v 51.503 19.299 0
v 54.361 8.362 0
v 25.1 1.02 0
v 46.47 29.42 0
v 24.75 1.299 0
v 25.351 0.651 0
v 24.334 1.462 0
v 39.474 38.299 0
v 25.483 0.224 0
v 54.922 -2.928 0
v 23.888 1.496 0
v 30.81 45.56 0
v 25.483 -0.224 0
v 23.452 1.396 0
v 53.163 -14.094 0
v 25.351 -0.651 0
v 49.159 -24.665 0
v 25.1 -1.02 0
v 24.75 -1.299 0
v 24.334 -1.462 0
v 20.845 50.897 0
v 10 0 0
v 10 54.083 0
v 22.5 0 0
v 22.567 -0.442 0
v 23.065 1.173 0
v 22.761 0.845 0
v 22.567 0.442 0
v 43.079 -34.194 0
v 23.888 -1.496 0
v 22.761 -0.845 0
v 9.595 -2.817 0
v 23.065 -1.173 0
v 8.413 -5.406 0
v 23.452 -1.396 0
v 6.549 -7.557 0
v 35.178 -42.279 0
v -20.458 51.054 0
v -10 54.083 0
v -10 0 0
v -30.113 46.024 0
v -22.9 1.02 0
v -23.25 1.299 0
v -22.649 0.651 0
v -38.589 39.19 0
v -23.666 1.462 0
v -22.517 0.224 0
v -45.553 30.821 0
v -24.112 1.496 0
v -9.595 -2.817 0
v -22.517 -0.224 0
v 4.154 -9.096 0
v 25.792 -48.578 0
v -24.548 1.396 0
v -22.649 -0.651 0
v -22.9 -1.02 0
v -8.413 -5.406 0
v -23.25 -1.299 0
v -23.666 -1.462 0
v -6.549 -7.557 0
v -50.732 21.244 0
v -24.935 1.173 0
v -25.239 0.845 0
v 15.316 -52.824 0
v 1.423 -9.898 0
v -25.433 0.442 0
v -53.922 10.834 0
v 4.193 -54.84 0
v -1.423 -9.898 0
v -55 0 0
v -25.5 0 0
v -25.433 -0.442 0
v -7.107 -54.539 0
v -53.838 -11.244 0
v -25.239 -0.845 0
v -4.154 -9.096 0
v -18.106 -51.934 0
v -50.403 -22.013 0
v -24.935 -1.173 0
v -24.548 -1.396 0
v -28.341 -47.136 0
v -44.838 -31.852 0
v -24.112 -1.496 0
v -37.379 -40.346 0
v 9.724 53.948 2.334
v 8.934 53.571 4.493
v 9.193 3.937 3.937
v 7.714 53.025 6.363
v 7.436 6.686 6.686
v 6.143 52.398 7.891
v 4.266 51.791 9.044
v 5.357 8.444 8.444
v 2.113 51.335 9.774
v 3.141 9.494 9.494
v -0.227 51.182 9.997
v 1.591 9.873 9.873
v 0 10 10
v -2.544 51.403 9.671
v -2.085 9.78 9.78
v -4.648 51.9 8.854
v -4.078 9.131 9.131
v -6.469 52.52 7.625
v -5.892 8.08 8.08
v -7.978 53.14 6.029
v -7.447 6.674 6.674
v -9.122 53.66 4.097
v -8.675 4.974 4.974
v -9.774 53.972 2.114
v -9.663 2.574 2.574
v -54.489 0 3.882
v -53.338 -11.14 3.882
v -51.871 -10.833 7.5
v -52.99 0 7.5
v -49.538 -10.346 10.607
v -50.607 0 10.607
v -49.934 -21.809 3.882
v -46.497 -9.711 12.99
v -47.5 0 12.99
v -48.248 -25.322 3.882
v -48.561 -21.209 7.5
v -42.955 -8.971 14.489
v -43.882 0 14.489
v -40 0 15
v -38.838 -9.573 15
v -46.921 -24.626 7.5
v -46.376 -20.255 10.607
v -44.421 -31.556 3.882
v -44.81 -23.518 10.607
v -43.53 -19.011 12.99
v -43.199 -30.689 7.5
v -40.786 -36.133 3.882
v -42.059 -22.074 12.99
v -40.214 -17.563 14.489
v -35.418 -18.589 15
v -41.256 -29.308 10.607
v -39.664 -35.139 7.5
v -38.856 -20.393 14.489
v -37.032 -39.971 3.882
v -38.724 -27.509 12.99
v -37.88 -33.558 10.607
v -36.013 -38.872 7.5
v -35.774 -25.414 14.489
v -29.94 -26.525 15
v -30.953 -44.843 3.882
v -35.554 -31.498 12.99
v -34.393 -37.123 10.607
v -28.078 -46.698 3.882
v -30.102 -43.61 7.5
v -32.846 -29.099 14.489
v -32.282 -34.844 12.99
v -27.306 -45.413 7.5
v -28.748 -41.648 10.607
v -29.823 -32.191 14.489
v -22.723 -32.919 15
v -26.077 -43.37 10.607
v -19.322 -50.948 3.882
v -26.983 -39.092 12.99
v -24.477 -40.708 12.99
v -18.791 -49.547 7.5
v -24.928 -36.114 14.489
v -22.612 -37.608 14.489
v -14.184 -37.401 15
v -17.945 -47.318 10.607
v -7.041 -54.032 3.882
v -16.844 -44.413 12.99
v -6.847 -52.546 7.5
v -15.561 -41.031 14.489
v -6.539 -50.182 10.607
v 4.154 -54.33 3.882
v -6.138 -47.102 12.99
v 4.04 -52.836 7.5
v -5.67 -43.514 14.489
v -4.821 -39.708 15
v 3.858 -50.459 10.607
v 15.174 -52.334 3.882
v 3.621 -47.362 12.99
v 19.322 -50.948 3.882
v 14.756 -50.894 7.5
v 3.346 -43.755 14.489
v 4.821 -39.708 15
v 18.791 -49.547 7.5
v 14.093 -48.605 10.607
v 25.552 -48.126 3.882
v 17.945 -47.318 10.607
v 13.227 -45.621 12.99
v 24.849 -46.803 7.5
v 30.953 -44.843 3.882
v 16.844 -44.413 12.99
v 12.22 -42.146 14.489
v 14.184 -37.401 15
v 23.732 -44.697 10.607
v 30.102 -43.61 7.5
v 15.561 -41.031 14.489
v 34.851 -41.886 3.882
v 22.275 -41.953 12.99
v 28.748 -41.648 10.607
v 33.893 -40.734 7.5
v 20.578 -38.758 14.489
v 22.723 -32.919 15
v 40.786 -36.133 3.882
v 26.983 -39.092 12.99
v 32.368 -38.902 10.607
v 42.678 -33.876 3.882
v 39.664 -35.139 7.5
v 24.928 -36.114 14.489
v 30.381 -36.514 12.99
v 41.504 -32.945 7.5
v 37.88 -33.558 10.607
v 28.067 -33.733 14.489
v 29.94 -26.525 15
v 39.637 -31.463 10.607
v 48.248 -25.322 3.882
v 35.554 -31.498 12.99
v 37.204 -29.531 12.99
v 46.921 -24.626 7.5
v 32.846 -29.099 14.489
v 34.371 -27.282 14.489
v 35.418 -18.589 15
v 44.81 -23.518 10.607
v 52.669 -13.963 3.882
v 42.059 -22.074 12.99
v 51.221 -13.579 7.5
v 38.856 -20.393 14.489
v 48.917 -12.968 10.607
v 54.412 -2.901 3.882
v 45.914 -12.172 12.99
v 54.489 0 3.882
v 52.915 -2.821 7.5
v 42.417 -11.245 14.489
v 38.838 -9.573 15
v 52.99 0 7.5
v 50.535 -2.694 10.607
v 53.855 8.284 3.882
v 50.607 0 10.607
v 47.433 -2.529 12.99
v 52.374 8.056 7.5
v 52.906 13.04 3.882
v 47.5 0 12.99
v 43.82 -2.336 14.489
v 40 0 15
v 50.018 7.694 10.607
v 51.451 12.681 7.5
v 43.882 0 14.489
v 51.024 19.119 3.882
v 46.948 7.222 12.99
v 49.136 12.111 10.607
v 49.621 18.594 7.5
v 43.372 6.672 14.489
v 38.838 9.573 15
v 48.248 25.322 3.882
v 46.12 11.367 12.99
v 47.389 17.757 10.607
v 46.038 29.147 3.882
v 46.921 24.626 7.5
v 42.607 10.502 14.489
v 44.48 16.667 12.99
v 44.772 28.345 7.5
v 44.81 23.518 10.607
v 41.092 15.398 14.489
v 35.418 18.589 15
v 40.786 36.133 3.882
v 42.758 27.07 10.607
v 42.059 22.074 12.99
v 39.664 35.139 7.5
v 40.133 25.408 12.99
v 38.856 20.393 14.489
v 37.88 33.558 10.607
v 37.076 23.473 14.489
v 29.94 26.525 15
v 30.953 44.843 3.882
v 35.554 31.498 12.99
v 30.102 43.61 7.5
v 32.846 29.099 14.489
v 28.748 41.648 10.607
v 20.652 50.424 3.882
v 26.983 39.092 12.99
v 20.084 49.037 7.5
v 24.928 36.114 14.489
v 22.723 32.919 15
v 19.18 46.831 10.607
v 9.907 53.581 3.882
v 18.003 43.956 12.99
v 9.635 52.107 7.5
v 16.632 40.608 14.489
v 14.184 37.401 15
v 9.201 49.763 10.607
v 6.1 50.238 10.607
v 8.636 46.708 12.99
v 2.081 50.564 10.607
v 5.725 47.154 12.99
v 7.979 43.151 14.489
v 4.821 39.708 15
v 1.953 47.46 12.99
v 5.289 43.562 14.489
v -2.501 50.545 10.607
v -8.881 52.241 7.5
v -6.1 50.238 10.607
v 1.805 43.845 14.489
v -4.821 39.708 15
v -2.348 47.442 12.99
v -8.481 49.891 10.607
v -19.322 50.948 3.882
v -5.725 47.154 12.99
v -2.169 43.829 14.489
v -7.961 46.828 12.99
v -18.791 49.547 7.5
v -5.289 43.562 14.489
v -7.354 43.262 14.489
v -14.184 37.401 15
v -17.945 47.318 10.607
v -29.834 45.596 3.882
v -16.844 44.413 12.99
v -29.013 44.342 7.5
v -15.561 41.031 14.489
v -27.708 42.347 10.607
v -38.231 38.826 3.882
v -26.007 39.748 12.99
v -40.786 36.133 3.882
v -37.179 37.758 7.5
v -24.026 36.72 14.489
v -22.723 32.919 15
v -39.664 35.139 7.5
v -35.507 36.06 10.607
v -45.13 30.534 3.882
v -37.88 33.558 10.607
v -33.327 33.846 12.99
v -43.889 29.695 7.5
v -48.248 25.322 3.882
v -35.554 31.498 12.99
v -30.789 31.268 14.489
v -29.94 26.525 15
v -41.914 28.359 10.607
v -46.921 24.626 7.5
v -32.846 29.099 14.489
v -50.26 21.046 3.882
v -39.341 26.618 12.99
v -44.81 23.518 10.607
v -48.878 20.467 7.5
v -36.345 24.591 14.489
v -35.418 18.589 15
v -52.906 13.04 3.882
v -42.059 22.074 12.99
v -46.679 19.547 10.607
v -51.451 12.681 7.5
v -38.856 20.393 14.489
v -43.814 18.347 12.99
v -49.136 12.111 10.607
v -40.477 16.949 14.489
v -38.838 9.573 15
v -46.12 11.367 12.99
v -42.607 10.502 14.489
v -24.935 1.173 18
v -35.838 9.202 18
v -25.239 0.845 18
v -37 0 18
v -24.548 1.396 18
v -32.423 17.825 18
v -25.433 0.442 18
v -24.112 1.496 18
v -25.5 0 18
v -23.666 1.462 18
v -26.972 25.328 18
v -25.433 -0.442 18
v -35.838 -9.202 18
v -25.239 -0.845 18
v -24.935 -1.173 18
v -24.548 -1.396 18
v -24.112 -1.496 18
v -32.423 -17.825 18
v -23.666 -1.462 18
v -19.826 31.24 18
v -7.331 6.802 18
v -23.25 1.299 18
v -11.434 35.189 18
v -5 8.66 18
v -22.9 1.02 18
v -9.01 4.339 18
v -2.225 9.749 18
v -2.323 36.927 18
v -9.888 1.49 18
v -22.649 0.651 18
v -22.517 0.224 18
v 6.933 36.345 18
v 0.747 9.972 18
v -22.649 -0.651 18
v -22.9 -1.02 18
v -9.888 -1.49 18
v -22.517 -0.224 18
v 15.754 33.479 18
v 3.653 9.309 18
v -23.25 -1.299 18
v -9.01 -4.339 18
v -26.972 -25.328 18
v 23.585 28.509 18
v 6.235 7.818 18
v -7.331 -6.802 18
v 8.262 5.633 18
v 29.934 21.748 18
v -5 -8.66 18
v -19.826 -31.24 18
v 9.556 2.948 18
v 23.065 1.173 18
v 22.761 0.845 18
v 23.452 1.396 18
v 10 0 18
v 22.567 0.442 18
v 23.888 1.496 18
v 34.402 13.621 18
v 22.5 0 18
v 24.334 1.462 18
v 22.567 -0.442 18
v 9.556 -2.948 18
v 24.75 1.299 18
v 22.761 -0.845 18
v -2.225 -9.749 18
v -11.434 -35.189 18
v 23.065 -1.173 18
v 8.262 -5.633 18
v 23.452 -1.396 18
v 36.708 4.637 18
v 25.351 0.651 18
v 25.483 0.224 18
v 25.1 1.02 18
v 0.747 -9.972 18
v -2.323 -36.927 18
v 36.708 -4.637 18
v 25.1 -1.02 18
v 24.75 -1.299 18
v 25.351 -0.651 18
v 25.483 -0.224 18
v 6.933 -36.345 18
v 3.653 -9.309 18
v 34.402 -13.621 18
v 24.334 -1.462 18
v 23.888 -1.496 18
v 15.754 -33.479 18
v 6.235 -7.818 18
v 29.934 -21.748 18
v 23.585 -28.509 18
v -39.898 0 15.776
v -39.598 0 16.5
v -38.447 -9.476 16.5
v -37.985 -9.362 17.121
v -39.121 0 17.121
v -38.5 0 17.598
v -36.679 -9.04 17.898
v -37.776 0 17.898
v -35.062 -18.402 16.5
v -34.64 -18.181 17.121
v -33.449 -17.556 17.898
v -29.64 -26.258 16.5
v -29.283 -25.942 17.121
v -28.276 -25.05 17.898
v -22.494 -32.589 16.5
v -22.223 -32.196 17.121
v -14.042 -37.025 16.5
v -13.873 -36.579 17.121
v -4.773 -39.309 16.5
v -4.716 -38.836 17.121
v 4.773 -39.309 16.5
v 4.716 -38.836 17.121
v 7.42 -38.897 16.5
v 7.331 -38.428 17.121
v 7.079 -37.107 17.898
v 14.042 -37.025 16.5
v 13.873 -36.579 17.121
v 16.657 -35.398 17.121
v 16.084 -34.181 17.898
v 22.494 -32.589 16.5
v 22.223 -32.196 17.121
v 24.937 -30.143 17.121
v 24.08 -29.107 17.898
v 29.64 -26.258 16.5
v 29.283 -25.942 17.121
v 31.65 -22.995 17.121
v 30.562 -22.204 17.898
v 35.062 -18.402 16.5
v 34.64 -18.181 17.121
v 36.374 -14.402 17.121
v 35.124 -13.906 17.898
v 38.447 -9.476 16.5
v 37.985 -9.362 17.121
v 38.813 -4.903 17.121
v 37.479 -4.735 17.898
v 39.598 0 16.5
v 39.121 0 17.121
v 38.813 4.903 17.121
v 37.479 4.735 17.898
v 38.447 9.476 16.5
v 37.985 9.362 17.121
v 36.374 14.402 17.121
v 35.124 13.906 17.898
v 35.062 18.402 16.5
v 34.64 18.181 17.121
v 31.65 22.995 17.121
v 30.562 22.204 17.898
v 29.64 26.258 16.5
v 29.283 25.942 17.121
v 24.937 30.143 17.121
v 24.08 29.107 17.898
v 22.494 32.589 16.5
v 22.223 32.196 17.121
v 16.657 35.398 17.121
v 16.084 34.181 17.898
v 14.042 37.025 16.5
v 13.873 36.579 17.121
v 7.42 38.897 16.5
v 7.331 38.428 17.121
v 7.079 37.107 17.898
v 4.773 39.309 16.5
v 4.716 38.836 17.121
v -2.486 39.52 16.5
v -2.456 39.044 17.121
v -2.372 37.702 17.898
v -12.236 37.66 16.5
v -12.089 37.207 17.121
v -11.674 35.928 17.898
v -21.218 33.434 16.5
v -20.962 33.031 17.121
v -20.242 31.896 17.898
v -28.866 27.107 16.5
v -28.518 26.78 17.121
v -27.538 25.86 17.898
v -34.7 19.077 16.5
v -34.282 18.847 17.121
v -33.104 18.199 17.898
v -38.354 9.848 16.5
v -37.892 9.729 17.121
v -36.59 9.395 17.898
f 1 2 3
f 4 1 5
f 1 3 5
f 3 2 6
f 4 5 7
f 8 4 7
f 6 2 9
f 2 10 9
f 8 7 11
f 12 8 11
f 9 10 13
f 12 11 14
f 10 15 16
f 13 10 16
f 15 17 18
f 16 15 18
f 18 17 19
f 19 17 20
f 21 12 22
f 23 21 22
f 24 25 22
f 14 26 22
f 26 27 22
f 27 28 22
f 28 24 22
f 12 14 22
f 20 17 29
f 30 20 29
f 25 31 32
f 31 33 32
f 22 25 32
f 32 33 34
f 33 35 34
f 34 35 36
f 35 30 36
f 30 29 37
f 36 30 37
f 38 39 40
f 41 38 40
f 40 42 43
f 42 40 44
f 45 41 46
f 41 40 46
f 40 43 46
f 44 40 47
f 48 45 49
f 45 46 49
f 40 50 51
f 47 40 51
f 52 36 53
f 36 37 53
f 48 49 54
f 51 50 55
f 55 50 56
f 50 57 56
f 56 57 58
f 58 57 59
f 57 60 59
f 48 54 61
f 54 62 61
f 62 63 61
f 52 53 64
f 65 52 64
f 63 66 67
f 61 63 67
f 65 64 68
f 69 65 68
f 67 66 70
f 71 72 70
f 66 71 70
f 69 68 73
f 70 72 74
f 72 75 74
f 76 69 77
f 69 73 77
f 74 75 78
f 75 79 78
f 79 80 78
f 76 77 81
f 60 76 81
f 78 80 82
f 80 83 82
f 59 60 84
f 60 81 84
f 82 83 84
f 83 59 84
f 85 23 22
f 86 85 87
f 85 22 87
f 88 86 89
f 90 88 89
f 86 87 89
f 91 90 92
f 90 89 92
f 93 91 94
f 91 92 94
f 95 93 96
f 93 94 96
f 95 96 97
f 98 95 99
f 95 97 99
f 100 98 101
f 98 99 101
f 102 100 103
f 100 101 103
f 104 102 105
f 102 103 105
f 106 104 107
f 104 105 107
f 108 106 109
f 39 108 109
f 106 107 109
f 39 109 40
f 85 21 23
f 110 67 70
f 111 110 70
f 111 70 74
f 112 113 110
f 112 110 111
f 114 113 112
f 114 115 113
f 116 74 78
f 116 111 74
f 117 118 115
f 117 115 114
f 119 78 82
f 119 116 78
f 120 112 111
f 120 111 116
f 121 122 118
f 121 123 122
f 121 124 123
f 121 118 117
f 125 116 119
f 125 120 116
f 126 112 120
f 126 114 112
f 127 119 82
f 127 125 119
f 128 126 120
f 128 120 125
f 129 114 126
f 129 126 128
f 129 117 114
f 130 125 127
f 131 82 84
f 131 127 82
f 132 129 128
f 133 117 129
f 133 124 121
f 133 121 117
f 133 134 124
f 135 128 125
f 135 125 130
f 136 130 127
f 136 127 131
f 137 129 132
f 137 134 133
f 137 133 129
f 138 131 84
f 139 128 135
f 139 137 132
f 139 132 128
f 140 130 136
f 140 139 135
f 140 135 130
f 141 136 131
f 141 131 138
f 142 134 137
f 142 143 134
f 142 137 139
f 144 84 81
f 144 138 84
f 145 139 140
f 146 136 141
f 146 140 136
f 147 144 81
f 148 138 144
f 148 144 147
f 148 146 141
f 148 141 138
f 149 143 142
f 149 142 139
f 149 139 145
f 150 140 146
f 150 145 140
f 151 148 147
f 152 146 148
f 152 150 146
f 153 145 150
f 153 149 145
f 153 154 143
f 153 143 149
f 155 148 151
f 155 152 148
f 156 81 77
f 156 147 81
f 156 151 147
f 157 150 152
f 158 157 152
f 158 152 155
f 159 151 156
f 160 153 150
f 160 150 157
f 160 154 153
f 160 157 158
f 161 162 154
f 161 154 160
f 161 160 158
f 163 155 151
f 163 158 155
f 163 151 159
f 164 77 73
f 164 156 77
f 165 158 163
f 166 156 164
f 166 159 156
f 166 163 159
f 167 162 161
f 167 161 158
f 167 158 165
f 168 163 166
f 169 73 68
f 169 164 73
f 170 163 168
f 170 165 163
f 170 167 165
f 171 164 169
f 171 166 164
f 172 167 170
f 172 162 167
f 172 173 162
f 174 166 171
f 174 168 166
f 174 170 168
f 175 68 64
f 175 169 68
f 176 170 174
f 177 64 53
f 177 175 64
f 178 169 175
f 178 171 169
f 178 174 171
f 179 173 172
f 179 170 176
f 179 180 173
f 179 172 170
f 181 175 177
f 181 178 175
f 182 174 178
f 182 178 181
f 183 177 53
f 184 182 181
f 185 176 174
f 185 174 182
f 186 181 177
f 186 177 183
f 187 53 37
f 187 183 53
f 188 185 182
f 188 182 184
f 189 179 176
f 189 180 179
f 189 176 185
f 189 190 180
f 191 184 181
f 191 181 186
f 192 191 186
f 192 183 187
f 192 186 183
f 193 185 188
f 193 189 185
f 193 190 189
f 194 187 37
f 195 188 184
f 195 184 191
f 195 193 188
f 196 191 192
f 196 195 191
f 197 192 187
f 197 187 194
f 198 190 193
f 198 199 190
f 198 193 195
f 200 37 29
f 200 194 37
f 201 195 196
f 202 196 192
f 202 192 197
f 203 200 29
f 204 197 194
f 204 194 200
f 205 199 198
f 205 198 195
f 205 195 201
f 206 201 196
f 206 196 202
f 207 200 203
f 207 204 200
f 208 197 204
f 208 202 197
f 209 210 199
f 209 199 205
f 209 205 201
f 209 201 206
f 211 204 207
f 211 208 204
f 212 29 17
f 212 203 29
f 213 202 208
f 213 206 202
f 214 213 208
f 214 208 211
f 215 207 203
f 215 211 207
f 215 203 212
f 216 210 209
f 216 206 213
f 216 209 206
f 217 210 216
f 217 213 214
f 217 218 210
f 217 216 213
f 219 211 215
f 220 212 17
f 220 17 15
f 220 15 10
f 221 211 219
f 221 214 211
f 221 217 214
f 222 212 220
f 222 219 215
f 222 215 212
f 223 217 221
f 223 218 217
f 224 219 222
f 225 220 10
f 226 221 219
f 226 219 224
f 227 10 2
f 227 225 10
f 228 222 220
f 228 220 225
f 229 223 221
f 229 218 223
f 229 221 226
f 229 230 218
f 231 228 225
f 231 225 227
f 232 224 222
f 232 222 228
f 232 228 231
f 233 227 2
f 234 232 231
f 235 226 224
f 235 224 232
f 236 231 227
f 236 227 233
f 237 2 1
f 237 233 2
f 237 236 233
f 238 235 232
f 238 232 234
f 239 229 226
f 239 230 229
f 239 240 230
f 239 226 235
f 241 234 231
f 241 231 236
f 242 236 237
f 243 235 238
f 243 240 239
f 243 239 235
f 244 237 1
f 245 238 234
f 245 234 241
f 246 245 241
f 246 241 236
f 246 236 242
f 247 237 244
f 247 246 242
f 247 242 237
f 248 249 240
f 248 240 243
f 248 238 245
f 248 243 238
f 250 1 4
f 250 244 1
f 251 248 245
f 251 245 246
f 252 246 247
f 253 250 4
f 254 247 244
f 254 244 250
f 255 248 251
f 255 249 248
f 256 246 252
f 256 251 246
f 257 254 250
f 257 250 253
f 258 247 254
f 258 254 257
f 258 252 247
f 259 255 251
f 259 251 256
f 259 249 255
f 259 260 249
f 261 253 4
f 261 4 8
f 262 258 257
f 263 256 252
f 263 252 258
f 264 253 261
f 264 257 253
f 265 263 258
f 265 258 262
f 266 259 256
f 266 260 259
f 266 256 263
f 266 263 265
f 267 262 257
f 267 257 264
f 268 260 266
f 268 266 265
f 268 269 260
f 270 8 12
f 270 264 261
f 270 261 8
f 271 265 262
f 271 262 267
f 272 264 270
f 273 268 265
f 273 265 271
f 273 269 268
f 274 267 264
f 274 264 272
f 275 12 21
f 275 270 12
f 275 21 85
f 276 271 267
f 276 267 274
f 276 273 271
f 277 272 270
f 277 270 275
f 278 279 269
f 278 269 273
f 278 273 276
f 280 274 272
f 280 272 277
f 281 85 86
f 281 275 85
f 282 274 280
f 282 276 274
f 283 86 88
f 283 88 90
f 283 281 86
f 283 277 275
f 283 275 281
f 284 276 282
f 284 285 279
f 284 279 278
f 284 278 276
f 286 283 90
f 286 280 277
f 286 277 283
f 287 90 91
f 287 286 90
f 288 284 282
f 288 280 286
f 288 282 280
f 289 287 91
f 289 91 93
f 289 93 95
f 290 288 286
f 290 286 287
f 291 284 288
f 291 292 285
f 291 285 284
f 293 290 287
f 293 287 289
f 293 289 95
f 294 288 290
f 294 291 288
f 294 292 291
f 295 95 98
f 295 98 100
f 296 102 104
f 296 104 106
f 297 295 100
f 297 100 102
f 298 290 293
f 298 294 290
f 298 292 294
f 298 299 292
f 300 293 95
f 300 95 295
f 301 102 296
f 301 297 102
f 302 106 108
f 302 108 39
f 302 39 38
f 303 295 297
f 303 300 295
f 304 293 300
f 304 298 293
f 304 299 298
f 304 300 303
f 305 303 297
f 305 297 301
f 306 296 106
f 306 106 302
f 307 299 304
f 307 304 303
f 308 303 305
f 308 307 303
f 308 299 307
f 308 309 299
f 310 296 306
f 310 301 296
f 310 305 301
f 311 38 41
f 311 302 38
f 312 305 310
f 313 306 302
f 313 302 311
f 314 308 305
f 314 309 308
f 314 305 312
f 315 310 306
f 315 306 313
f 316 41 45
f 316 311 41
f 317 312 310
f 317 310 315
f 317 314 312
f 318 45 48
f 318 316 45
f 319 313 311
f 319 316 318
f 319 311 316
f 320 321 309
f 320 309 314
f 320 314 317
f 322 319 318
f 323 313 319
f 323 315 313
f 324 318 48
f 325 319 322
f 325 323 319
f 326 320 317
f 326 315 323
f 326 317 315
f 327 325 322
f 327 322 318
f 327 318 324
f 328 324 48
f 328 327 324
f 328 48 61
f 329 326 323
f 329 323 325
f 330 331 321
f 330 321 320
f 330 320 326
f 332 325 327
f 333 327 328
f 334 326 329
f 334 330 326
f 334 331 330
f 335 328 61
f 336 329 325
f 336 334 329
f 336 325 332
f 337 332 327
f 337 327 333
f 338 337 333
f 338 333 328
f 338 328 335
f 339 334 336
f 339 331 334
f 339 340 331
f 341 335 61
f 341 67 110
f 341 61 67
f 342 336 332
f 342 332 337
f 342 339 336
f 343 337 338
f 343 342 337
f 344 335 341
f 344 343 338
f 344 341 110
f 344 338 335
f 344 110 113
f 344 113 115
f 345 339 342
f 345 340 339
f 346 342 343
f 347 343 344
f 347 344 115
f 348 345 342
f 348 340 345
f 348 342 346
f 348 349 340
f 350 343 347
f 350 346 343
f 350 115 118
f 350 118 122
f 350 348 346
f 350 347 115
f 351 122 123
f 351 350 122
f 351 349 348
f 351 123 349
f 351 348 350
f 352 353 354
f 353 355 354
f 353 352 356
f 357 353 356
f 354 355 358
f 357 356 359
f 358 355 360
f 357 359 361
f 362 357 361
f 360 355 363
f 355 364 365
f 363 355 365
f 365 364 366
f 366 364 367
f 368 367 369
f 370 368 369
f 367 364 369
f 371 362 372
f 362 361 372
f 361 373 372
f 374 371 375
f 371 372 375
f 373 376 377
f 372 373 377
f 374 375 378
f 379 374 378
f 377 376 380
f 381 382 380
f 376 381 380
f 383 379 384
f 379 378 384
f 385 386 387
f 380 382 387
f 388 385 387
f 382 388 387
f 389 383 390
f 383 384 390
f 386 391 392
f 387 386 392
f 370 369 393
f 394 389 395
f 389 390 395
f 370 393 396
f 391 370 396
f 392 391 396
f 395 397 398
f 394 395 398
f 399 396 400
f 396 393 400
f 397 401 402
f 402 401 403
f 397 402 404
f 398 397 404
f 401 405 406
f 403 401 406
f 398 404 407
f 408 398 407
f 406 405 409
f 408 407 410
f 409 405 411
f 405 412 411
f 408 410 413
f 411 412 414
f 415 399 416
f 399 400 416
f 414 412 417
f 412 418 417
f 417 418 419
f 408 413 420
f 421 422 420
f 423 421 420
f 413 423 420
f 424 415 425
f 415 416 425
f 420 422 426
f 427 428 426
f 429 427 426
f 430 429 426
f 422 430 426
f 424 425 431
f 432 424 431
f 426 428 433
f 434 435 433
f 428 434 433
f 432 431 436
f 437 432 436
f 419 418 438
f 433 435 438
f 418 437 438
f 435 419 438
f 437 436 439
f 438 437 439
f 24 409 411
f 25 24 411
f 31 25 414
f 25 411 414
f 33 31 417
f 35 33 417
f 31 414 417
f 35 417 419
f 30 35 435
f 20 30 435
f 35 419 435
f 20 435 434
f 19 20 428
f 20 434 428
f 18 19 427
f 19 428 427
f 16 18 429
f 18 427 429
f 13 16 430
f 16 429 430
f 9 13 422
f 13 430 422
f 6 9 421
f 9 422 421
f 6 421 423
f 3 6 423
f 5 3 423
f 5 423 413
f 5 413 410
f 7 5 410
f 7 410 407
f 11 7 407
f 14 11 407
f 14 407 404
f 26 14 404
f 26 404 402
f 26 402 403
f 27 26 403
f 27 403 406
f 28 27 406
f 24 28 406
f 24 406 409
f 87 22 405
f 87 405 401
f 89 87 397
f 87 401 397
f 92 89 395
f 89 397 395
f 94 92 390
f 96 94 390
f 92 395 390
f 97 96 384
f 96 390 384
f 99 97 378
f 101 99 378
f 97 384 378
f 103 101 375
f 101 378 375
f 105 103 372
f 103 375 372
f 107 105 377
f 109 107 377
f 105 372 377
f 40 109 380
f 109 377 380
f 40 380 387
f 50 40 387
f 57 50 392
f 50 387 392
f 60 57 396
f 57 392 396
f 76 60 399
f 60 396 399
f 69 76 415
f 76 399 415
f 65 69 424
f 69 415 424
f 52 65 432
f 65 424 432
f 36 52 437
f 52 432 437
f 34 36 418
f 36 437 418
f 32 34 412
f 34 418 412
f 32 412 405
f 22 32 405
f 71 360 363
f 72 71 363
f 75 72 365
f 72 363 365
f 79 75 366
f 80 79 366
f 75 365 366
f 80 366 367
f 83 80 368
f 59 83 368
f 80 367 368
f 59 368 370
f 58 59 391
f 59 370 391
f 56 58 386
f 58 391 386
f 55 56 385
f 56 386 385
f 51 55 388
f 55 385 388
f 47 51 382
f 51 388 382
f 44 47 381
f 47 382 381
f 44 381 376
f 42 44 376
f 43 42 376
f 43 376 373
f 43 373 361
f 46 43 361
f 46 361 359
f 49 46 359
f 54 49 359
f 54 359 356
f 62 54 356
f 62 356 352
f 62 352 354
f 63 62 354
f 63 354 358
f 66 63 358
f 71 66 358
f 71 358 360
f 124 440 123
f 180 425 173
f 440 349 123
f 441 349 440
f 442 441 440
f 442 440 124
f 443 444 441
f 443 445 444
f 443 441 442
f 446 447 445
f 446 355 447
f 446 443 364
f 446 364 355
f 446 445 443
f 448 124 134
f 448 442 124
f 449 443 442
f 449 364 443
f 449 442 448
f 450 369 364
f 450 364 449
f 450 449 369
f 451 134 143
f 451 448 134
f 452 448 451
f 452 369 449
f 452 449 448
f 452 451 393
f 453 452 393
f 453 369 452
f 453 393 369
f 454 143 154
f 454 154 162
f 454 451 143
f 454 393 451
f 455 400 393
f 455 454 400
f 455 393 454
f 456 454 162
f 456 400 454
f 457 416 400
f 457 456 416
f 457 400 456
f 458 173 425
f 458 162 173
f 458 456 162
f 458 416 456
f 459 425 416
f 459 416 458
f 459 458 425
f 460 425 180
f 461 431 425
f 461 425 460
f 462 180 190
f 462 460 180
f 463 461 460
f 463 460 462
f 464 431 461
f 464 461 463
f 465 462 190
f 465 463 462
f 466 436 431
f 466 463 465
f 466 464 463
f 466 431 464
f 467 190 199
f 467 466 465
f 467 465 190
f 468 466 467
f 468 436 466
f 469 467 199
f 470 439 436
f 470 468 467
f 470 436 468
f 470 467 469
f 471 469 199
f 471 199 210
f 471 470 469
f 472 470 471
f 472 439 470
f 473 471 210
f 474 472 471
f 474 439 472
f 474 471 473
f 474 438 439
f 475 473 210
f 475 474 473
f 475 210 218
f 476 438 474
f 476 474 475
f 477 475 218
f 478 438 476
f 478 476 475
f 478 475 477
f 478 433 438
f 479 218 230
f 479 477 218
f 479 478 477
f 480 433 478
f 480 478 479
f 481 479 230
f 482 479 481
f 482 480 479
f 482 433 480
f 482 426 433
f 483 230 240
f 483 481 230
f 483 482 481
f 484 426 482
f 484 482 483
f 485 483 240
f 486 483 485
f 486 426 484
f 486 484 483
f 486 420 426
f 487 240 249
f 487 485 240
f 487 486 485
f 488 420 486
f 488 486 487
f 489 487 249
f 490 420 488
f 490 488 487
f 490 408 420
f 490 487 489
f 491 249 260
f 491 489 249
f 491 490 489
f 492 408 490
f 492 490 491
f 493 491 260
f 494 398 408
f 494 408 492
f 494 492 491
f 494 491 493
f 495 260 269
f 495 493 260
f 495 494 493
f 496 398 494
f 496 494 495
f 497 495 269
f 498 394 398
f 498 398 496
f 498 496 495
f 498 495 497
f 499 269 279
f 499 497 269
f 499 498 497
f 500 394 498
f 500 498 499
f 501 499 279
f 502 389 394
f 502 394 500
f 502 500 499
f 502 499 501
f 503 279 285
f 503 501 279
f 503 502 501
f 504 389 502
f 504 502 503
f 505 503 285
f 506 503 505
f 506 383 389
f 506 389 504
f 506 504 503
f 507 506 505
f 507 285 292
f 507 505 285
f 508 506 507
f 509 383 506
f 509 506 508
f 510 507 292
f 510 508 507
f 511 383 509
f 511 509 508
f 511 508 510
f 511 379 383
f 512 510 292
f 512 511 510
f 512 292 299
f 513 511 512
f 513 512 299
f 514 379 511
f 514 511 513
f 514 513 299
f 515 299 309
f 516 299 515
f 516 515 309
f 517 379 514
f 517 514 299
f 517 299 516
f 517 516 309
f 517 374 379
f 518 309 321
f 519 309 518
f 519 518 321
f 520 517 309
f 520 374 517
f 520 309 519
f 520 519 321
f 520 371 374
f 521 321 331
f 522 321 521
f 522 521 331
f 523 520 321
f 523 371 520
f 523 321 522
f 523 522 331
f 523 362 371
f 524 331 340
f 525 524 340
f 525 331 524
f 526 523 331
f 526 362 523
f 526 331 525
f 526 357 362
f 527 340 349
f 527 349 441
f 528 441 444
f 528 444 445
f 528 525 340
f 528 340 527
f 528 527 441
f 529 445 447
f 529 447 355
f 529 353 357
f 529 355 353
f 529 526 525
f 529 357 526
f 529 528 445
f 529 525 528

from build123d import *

# Parameters (mm, degrees)
F0_W     = 10
F0_H     = 25.0418604054
F0_H_2   = 18
F0_H_3   = 6.9581395946
F3_R     = 10
F4_DEPTH = 141.6
F7_D     = 3
F8_D     = 3
F9_R     = 2.99999


# Not quite as in the source:
# - a fillet or chamfer that OpenCascade refuses, or shapes differently, is made with other operations: its cross-section is extruded or revolved along the edge and cut away or added
# - a fillet or chamfer is up to 0.001 mm smaller than in the source, because OpenCascade refuses the exact size


with BuildPart() as f1:
    # F0 (on Front) → F1 (revolve)
    with BuildSketch(Plane.XZ):
        Polygon((-55, 15), (-55, 0), (0, 0), (0, 18), (-40, 18), (-40, 15), align=None)
    revolve(axis=Axis((0, 0, 9), (0, 0, 1)))

    # F0 (on Front) → F2 (revolve, cut)
    with BuildSketch(Plane.XZ):
        with Locations((5, 30.5209302027)):
            Rectangle(F0_W, F0_H)
        with Locations((5, 9)):
            Rectangle(F0_W, F0_H_2)
        with Locations((5, -3.4790697973)):
            Rectangle(F0_W, F0_H_3)
    revolve(axis=Axis((0, 0, 18.0418604054), (0, 0, 1)), mode=Mode.SUBTRACT)

    # F3 (on Front) → F4 (cut)
    with BuildSketch(Plane.XZ):
        Circle(F3_R)
    extrude(amount=-F4_DEPTH, mode=Mode.SUBTRACT)

    # F5: fillet of radius 15 on 1 edges, made by hand

    # F5_s1 → F5_t2 (revolve, cut)
    with BuildSketch(Plane.XZ):
        with BuildLine():
            ThreePointArc((-55, 0), (-50.6066017178, 10.6066017178), (-40, 15))
            Line((-40, 15), (-55, 15))
            Line((-55, 15), (-55, 0))
        make_face()
    revolve(axis=Axis((0, 0, 15), (0, 0, 1)), mode=Mode.SUBTRACT)

    # F7 (through all)
    with Locations(Plane(origin=(0, 0, 0), x_dir=(1, 0, 0), z_dir=(0, 0, -1))):
        with Locations((24, 0)):
            Hole(F7_D / 2)

    # F8 (through all)
    with Locations(Plane(origin=(0, 0, 0), x_dir=(1, 0, 0), z_dir=(0, 0, -1))):
        with Locations((-24, 0)):
            Hole(F8_D / 2)

    # F9 (radius 3 in the source; OpenCascade refuses exactly that, so slightly less here)
    f9_edges = [f1.edges().sort_by_distance(p)[0] for p in [
        (40, 0, 18),
    ]]
    fillet(f9_edges, radius=F9_R)


solid = f1.part
